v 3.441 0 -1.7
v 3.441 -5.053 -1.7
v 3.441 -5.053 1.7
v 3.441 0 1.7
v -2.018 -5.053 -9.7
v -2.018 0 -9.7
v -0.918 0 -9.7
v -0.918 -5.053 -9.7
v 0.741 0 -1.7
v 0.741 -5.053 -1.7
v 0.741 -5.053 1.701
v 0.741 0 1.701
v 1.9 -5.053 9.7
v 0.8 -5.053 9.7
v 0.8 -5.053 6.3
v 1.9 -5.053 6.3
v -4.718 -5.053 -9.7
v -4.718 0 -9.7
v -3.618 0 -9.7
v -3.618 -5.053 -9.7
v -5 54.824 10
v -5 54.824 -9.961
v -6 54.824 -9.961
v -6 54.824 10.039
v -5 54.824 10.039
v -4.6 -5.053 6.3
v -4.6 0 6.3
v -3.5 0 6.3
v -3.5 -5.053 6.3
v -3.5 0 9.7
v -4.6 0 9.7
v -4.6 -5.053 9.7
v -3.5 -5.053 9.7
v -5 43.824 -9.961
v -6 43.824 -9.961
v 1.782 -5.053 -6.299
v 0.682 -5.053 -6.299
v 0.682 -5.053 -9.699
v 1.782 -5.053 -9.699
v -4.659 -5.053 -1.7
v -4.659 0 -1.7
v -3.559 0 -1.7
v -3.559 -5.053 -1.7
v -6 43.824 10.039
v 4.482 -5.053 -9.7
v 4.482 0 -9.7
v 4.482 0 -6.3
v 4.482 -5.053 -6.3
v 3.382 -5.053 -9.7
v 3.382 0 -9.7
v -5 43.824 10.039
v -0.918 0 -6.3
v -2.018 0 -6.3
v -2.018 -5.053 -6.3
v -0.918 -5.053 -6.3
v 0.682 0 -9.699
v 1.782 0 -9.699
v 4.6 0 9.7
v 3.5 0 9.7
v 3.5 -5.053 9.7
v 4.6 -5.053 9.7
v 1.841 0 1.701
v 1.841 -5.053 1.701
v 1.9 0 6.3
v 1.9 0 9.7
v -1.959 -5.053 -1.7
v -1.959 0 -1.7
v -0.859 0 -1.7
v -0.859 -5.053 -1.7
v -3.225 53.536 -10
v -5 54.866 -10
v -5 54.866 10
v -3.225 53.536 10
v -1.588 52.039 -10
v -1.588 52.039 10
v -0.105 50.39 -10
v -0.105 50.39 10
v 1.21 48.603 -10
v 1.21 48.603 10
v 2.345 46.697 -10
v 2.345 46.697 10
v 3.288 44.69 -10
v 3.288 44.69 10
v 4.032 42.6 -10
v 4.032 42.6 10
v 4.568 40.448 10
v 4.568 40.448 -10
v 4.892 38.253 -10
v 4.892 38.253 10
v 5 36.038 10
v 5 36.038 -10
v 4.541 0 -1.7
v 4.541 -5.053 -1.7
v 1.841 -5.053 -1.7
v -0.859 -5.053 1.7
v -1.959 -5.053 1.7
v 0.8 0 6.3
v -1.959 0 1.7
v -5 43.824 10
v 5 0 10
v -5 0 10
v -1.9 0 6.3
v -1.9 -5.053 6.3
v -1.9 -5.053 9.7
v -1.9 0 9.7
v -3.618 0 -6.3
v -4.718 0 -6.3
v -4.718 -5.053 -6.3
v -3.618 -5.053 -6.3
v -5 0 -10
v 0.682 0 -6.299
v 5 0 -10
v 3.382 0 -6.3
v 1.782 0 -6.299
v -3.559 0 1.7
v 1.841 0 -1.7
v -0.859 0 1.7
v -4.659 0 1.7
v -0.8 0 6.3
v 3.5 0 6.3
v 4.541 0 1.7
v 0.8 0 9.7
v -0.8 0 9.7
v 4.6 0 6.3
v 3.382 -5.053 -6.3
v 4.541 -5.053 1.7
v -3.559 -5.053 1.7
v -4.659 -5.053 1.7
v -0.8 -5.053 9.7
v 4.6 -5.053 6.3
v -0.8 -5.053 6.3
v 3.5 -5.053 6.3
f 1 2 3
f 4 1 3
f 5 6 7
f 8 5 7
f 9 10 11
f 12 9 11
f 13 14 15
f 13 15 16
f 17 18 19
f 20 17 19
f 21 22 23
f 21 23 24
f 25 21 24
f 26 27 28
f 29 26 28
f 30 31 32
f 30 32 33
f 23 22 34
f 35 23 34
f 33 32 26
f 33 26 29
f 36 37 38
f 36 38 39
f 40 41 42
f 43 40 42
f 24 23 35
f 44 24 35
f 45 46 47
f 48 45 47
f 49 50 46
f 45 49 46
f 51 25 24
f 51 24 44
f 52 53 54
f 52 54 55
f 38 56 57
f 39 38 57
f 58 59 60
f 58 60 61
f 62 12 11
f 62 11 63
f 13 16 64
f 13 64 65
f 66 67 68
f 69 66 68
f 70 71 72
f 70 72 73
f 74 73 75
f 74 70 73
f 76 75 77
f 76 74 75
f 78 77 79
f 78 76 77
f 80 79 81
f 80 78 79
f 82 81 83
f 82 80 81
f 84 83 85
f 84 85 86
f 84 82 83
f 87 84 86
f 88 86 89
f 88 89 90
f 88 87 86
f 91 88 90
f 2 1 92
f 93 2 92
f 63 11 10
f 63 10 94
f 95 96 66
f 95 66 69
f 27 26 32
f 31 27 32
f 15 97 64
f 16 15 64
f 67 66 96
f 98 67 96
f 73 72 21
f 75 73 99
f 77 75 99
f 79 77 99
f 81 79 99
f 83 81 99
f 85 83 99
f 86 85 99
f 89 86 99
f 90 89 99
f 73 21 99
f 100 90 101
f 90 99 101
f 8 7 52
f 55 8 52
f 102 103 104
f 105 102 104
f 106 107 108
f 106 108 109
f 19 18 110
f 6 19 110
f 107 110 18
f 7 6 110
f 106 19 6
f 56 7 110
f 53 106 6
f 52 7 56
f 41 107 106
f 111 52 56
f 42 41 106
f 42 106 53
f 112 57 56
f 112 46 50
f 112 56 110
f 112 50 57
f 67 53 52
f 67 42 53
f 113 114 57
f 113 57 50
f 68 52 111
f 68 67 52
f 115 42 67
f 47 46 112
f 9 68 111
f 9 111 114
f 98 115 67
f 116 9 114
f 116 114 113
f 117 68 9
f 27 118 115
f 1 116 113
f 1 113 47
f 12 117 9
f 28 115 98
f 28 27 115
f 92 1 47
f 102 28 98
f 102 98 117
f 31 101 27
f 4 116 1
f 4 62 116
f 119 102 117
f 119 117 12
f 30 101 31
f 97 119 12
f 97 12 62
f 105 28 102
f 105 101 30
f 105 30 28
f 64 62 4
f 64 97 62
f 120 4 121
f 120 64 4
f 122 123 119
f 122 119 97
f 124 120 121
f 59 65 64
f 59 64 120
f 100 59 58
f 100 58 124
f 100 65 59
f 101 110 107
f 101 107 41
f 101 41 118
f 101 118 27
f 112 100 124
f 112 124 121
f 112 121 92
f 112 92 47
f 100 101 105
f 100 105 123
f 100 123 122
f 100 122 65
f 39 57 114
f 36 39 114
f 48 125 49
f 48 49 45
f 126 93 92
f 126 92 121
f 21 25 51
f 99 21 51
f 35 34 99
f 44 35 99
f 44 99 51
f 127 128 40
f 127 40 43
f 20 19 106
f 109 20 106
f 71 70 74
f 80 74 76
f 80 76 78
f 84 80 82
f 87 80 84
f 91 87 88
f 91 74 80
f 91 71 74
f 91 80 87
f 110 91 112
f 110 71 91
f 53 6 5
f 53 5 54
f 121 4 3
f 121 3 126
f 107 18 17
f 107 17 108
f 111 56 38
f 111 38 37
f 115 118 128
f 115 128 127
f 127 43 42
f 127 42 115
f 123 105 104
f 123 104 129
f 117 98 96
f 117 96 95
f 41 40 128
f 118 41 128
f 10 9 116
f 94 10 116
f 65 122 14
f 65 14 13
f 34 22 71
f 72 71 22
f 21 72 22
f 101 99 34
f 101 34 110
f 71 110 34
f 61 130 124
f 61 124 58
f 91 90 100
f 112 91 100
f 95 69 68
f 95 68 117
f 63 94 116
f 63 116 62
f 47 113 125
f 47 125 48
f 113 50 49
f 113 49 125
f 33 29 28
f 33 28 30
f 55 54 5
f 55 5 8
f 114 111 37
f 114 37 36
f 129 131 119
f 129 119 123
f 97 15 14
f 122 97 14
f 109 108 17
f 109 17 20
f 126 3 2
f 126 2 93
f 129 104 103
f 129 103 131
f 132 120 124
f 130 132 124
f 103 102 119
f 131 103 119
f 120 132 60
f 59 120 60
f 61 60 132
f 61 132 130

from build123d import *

# Parameters (mm, degrees)
F0_W        = 10
F0_H        = 20
F1_DEPTH    = 25
F3_W        = 30
F3_H        = 20
F4_DEPTH    = 10
F5_T1_DEPTH = 114.1408313715
F6_W        = 11
F6_H        = 20
F7_DEPTH    = 1
F8_W        = 1.1
F8_H        = 3.4004326878
F9_DEPTH    = 5.0529


# Not quite as in the source:
# - a fillet or chamfer that OpenCascade refuses, or shapes differently, is made with other operations: its cross-section is extruded or revolved along the edge and cut away or added


with BuildPart() as f1:
    # F0 (on Front) → F1 (new body)
    with BuildSketch(Plane.XZ):
        Rectangle(F0_W, F0_H)
    extrude(amount=-F1_DEPTH)

    # F3 (on face) → F4 (join)
    with BuildSketch(Plane(origin=(-5, 0, 0), x_dir=(0, -1, 0), z_dir=(-1, 0, 0))):
        with Locations((-39.8661582013, 0)):
            Rectangle(F3_W, F3_H)
    extrude(amount=-F4_DEPTH)

    # F5: fillet of radius 22.7249922626 on 1 edges, made by hand

    # F5_s2 → F5_t1 (cut)
    with BuildSketch(Plane.XY.offset(-57.0704156857)):
        with BuildLine():
            ThreePointArc((-5, 54.8661582013), (2.3448934377, 46.697492915), (5, 36.037991927))
            Line((5, 36.037991927), (5, 54.8661582013))
            Line((5, 54.8661582013), (-5, 54.8661582013))
        make_face()
    extrude(amount=F5_T1_DEPTH, mode=Mode.SUBTRACT)

    # F6 (on face) → F7 (join)
    with BuildSketch(Plane(origin=(-5, 0, 0), x_dir=(0, -1, 0), z_dir=(-1, 0, 0))):
        with Locations((-49.3244222254, 0.0391426826)):
            Rectangle(F6_W, F6_H)
    extrude(amount=F7_DEPTH)

    # F8 (on face) → F9 (join)
    with BuildSketch(Plane.XZ):
        with Locations((-4.05, 7.9997836561)):
            Rectangle(F8_W, F8_H)
        with Locations((-1.35, 7.9997836561)):
            Rectangle(F8_W, F8_H)
        with Locations((1.35, 7.9997836561)):
            Rectangle(F8_W, F8_H)
        with Locations((4.05, 7.9997836561)):
            Rectangle(F8_W, F8_H)
        with Locations((-4.1088341387, 0)):
            Rectangle(F8_W, F8_H)
        with Locations((-4.1676682773, -7.9997836561)):
            Rectangle(F8_W, F8_H)
        with Locations((-1.4088339935, 1.97401e-05)):
            Rectangle(F8_W, F8_H)
        with Locations((-1.467667987, -7.9997441759)):
            Rectangle(F8_W, F8_H)
        with Locations((1.2911689242, 0.0004164637)):
            Rectangle(F8_W, F8_H)
        with Locations((1.2323378484, -7.9989507287)):
            Rectangle(F8_W, F8_H)
        with Locations((3.9911658613, 0)):
            Rectangle(F8_W, F8_H)
        with Locations((3.9323317227, -7.9997836561)):
            Rectangle(F8_W, F8_H)
    extrude(amount=F9_DEPTH)


solid = f1.part
